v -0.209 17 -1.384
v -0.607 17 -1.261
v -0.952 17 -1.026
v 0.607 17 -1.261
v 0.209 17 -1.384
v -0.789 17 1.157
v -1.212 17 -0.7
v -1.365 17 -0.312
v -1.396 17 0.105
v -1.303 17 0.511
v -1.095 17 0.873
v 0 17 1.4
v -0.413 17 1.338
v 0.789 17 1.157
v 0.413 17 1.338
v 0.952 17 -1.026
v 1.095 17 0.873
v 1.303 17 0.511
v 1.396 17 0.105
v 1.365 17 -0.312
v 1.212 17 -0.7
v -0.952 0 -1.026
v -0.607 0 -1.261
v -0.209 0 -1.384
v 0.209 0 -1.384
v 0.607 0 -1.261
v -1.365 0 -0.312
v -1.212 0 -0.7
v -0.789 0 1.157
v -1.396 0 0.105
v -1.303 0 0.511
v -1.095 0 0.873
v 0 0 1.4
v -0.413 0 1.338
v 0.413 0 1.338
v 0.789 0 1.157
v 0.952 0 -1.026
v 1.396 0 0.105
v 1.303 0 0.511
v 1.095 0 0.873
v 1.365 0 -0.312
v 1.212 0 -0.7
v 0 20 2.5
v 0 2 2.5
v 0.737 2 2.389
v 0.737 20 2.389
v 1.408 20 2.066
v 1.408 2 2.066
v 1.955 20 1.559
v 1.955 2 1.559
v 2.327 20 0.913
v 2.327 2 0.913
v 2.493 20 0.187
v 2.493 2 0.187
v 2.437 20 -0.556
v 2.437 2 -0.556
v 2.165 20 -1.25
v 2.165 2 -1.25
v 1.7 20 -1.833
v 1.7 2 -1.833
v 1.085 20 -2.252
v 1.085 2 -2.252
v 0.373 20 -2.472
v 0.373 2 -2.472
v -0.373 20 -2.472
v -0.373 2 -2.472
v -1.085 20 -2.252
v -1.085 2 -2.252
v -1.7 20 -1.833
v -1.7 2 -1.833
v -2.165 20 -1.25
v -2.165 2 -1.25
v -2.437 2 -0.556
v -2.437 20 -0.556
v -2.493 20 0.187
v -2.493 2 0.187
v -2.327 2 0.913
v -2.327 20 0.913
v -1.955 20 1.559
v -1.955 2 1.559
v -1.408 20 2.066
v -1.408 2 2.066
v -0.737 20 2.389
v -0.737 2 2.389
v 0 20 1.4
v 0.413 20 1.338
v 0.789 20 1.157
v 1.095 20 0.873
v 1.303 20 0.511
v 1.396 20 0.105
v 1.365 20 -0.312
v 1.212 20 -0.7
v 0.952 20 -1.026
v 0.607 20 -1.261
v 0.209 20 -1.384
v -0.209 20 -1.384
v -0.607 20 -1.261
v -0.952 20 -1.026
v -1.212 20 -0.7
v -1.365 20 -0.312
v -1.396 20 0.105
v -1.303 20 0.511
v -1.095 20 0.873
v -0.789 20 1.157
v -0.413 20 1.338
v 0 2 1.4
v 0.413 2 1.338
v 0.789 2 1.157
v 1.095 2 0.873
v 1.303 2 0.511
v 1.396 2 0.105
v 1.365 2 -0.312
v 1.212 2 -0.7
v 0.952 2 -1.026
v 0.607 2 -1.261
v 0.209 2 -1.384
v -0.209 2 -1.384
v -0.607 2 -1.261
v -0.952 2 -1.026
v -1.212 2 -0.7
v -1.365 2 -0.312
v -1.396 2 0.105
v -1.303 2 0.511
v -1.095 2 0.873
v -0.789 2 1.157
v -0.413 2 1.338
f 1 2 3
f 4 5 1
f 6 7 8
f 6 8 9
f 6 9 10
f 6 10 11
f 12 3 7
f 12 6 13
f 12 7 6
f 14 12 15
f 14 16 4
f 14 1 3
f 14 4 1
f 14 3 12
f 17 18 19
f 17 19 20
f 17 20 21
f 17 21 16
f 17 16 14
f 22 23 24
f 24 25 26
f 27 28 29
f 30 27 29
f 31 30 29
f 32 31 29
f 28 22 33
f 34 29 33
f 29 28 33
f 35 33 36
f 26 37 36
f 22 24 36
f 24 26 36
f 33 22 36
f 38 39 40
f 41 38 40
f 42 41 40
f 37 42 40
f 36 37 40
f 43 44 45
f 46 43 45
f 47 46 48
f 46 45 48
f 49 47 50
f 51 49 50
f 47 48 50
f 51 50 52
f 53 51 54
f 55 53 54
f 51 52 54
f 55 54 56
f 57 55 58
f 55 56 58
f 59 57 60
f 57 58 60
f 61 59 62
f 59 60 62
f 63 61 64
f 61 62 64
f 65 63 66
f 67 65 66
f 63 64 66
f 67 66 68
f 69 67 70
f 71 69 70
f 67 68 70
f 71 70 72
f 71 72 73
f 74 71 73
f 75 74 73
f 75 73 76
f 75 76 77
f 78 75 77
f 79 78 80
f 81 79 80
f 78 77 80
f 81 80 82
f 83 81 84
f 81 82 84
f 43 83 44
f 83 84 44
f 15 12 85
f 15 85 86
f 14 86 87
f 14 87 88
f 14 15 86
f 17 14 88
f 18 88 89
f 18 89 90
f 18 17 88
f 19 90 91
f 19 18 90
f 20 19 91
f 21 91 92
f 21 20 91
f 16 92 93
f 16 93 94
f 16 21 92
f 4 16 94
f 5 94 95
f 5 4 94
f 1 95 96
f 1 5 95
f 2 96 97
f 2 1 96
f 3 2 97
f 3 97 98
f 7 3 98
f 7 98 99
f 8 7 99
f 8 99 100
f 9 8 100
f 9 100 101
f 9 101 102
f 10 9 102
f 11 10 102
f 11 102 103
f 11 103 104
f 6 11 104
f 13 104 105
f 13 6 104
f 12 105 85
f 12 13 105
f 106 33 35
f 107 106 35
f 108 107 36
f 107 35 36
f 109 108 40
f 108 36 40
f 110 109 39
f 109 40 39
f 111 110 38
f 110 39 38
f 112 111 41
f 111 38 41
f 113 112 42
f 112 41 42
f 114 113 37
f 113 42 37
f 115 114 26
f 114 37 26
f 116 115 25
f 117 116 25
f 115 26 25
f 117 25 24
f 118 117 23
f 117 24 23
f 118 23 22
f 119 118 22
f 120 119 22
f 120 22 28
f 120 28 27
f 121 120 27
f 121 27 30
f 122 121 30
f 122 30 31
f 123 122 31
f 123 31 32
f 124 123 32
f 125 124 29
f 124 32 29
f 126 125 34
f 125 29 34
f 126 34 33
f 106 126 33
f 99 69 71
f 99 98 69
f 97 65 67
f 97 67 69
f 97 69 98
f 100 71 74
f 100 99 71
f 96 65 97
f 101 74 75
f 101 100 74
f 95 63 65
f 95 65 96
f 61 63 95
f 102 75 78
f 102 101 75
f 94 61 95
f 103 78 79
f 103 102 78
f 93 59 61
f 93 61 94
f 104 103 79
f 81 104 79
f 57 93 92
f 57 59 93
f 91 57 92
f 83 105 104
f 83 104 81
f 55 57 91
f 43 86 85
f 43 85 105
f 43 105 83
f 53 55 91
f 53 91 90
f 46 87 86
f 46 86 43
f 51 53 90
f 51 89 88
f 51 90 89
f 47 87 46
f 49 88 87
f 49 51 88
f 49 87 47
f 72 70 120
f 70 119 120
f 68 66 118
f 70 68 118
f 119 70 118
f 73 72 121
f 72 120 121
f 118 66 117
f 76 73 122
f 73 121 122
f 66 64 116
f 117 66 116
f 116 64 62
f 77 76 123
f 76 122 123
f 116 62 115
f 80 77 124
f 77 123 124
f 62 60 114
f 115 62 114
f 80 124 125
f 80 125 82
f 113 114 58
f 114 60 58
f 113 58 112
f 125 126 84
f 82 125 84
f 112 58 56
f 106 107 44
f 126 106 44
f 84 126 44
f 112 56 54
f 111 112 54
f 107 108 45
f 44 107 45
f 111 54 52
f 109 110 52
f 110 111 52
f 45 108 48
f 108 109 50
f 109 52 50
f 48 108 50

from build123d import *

# Parameters (mm, degrees)
SKETCH_1_R          = 1.4
EXTRUDE_1_DEPTH     = 2
SKETCH_2_R          = 2.5
EXTRUDE_2_DEPTH     = 18
CUT_EXTRUDE_START   = -3
SKETCH_3_R          = 1.4
CUT_EXTRUDE_1_DEPTH = 3


with BuildPart() as part:
    # 草图1 → 凸台-拉伸1 (new body)
    with BuildSketch(Plane(origin=(0, 0, 0), x_dir=(1, 0, 0), z_dir=(0, 1, 0))):
        with Locations(Location((0, 0, 0), (0, 0, 270))):
            Circle(SKETCH_1_R)
    extrude(amount=EXTRUDE_1_DEPTH)

    # 草图2 → 凸台-拉伸2 (add)
    with BuildSketch(Plane(origin=(0, 2, 0), x_dir=(1, 0, 0), z_dir=(0, 1, 0))):
        with Locations(Location((0, 0, 0), (0, 0, 270))):
            Circle(SKETCH_2_R)
    extrude(amount=EXTRUDE_2_DEPTH)

    # 草图3 → 切除-拉伸1 (cut)
    with BuildSketch(Plane(origin=(0, 20, 0), x_dir=(1, 0, 0), z_dir=(0, 1, 0)).offset(CUT_EXTRUDE_START)):
        with Locations(Location((0, 0, 0), (0, 0, 270))):
            Circle(SKETCH_3_R)
    extrude(amount=CUT_EXTRUDE_1_DEPTH, mode=Mode.SUBTRACT)


solid = part.part
